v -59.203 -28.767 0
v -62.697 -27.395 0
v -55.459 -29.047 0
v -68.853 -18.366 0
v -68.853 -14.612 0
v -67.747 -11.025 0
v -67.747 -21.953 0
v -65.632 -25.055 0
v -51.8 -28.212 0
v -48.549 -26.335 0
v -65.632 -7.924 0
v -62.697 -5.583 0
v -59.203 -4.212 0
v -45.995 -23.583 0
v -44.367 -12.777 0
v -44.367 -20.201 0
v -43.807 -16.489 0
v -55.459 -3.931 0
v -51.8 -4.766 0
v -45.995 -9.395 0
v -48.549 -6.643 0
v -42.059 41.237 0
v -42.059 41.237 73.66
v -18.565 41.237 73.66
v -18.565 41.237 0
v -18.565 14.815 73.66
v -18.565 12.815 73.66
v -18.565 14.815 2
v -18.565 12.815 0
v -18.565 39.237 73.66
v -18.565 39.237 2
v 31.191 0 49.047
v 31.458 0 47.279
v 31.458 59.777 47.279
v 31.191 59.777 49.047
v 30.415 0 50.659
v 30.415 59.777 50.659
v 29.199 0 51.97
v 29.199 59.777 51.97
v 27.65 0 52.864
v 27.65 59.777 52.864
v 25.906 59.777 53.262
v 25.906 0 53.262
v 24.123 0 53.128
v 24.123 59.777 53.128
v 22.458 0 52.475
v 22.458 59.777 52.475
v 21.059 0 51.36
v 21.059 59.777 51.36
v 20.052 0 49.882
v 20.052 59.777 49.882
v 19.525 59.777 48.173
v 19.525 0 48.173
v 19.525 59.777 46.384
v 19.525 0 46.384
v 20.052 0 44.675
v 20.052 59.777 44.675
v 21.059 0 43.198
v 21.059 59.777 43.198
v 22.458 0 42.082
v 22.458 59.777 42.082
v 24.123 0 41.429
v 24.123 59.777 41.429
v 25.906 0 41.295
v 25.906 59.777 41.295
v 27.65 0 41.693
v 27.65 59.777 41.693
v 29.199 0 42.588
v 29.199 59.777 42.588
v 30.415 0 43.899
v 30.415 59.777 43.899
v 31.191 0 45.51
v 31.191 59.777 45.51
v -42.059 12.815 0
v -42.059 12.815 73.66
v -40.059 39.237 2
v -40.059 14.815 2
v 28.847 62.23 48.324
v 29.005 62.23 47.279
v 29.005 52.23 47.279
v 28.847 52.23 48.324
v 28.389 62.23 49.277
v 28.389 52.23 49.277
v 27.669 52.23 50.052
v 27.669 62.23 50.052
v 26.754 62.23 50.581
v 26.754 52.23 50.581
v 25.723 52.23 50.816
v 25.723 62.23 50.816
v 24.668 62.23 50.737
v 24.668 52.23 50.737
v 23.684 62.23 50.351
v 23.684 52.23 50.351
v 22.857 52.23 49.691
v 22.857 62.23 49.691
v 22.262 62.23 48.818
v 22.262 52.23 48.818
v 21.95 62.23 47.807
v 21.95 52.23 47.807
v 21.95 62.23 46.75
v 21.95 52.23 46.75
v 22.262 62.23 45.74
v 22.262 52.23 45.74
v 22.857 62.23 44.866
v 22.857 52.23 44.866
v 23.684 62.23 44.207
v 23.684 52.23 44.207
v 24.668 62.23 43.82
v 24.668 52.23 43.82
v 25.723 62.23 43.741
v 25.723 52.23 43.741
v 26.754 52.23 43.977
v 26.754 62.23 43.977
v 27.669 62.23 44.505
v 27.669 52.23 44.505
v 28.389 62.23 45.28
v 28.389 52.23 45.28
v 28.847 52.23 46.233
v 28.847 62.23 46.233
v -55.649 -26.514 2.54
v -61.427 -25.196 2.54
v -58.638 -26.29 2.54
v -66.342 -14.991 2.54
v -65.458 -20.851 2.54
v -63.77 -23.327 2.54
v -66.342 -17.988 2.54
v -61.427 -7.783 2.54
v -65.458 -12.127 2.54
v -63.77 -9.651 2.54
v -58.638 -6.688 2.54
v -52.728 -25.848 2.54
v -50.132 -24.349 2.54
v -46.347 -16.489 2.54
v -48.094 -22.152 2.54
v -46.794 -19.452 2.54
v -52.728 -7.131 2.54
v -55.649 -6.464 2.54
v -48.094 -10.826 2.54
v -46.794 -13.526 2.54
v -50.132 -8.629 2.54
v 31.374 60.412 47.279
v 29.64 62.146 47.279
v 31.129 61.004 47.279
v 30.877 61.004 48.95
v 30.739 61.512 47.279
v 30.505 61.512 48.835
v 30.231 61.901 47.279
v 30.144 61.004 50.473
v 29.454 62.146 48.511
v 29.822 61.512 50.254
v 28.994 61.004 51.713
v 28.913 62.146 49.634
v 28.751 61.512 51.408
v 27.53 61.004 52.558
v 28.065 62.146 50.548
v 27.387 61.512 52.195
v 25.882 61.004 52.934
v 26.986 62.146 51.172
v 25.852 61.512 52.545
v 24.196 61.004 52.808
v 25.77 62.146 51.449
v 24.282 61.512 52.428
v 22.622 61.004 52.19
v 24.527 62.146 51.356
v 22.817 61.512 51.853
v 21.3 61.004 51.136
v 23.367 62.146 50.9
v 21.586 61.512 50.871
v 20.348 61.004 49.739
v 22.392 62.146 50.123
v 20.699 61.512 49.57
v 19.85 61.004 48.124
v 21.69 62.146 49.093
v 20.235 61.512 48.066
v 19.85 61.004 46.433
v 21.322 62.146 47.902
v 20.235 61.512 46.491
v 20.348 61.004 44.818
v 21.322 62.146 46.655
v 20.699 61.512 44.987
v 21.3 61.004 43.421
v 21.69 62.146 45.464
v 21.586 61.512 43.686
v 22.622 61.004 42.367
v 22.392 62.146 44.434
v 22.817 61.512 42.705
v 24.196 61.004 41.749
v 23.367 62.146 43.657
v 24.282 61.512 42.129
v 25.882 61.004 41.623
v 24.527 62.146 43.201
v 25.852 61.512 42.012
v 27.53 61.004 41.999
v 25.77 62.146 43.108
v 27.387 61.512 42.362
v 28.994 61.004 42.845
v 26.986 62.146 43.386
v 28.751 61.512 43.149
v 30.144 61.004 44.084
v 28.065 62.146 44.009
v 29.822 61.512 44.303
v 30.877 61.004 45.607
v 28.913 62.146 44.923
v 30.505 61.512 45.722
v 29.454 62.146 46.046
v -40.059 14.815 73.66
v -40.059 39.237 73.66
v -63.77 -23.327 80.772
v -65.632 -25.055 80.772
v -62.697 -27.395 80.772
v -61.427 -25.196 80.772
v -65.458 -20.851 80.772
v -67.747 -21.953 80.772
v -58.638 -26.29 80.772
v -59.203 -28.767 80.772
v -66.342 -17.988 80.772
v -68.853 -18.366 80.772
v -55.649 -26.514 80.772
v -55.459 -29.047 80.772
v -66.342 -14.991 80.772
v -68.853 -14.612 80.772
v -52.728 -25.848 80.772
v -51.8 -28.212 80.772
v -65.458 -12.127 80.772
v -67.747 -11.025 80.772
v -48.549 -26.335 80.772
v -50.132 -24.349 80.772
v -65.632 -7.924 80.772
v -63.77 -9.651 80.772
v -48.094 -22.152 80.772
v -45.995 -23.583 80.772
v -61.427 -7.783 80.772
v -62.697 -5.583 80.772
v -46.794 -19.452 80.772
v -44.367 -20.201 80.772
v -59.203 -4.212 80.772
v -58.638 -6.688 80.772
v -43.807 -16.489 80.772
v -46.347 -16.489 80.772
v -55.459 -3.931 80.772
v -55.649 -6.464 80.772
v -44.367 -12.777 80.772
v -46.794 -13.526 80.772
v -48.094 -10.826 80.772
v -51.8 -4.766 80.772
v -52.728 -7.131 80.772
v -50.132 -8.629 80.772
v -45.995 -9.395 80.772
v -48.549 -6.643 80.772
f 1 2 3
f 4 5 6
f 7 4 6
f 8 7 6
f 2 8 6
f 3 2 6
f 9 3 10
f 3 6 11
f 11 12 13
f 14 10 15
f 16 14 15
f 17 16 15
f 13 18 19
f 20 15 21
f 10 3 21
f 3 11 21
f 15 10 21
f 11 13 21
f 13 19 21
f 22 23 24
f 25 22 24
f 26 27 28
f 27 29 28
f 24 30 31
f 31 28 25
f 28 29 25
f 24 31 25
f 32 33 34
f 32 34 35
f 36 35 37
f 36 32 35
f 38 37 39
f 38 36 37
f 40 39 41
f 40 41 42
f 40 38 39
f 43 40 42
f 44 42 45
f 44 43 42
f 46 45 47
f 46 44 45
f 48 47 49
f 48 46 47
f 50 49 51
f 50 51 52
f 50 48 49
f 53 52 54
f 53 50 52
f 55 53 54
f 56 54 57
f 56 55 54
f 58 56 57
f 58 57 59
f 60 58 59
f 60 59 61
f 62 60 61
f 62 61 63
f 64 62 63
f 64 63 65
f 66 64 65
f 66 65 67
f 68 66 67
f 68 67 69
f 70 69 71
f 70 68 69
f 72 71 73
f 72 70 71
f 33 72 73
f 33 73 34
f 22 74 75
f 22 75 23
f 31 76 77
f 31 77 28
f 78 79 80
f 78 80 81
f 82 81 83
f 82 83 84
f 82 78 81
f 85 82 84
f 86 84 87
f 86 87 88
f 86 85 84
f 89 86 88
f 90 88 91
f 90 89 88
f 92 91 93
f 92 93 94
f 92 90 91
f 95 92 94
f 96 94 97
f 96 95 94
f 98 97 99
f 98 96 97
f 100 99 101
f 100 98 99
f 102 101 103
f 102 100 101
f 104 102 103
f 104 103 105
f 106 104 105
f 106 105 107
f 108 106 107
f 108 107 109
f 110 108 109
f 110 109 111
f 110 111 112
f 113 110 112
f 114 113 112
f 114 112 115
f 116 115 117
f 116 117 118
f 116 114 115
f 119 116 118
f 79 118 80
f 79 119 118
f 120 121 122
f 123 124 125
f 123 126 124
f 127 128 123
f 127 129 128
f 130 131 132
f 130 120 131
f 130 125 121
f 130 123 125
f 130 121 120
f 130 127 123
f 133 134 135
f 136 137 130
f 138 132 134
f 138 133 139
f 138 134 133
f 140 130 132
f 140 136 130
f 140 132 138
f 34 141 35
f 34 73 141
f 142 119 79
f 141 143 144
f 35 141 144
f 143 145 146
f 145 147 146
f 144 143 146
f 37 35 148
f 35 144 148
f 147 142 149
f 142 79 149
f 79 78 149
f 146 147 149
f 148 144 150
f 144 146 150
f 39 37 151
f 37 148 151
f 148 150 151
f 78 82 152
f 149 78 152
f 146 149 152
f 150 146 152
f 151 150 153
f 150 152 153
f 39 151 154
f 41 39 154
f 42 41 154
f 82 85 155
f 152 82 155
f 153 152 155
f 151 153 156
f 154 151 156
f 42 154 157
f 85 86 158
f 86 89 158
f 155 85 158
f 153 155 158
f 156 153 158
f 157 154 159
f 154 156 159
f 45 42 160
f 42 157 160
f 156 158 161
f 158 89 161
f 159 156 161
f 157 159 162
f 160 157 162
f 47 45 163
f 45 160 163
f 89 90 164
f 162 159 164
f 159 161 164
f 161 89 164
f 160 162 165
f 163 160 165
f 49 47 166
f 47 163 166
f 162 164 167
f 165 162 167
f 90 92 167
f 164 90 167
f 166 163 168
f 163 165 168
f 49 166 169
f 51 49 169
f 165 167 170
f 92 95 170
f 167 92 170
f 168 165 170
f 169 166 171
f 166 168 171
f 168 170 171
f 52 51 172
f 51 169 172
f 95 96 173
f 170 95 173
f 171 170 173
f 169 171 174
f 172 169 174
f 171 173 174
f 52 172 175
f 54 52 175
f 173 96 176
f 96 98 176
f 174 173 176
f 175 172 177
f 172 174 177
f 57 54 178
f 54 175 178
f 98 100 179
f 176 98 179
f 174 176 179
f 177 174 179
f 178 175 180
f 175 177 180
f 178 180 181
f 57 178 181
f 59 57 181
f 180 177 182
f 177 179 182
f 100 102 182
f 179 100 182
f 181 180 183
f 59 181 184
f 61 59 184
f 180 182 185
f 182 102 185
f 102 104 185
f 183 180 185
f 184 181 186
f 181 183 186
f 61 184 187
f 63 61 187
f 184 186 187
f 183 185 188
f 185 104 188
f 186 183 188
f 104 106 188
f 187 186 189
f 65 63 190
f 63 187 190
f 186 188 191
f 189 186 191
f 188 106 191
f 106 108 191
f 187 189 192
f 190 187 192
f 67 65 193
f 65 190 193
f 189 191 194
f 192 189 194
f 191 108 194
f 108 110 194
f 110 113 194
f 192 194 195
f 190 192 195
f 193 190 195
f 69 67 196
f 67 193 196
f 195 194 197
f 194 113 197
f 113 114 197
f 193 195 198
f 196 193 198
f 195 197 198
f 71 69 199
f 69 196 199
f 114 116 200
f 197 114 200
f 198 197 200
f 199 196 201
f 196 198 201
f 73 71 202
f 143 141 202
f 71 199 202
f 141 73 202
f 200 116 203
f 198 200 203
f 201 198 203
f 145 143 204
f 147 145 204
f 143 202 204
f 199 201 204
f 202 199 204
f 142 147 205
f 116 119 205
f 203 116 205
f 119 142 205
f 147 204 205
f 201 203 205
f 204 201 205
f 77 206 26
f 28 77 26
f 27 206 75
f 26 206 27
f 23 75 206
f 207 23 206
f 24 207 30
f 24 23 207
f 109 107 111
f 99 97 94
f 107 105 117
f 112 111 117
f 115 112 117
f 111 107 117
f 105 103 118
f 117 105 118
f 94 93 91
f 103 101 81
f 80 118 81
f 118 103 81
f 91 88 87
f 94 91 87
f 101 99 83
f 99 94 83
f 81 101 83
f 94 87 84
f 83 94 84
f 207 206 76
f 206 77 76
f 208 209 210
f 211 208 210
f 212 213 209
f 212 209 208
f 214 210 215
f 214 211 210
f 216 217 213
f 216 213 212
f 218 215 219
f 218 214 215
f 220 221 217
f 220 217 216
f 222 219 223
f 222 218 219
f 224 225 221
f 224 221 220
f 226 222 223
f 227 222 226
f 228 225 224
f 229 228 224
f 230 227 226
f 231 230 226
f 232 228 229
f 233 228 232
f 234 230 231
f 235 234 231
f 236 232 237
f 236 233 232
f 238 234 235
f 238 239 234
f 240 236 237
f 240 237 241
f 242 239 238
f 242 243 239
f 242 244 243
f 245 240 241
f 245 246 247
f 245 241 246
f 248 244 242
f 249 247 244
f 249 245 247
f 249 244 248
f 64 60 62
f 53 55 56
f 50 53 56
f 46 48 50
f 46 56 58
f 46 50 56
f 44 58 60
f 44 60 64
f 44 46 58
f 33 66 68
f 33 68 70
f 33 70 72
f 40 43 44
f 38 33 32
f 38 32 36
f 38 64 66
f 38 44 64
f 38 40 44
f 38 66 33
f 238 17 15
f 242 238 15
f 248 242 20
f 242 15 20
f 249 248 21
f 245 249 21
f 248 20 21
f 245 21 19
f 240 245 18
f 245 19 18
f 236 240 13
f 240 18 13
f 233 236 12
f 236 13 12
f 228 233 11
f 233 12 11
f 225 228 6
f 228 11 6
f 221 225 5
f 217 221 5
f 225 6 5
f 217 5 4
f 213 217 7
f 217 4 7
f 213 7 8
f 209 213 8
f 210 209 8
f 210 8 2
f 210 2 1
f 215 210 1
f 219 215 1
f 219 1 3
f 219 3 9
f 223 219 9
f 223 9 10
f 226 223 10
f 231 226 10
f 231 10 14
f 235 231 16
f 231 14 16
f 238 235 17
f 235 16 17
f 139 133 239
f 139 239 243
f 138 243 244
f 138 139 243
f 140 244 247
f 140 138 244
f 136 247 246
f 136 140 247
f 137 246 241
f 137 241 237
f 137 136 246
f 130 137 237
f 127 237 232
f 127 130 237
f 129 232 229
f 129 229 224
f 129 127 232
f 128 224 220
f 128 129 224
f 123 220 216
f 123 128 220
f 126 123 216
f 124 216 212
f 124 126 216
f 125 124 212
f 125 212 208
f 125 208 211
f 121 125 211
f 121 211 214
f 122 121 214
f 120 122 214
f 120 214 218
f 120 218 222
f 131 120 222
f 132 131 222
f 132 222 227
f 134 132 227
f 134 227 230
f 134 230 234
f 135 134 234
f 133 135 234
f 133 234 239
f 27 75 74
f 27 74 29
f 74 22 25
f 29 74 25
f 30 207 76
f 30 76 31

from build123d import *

# Parameters (mm, degrees)
F0_W      = 23.4936941415
F0_H      = 28.4224431962
F1_DEPTH  = 73.66
F2_T      = -2
F3_R      = 6
F4_DEPTH  = 62.23
F5_R      = 12.5933558232
F6_DEPTH  = 80.772
F7_T      = -2.54
F8_R      = 2.4528409794
F9_DEPTH  = 6.604
F10_DEPTH = 6.35
F11_DEPTH = 16.51
F12_DEPTH = 10


with BuildPart() as f1:
    # F0 (on Top) → F1 (new body)
    with BuildSketch(Plane.XY):
        with Locations((-30.3117958829, 27.0259650424)):
            Rectangle(F0_W, F0_H)
    extrude(amount=F1_DEPTH)

    # F2
    f2_openings = [f1.faces().sort_by_distance(p)[0] for p in [
        (-30.311796, 27.025965, 73.66),
        (-18.564949, 27.025965, 36.83),
    ]]
    offset(amount=F2_T, openings=f2_openings)


with BuildPart() as f4:
    # F3 (on Front) → F4 (new body)
    with BuildSketch(Plane.XZ):
        with Locations((25.4577267915, 47.2786352038)):
            Circle(F3_R)
    extrude(amount=-F4_DEPTH)

    # F8
    f8_edges = [f4.edges().sort_by_distance(p)[0] for p in [
        (19.457727, 62.23, 47.278635),
    ]]
    fillet(f8_edges, radius=F8_R)

    # F9 (add): a face of the model
    f9_faces = [f4.faces().sort_by_distance(p)[0] for p in [
        (25.4577267915, 62.23, 47.2786352038),
    ]]
    extrude(f9_faces, amount=-F9_DEPTH)

    # F10 (add): a face of the model
    f10_faces = [f4.faces().sort_by_distance(p)[0] for p in [
        (25.4577267915, 62.23, 47.2786352038),
    ]]
    extrude(f10_faces, amount=-F10_DEPTH)

    # F11 (add): a face of the model
    f11_faces = [f4.faces().sort_by_distance(p)[0] for p in [
        (25.4577267915, 62.23, 47.2786352038),
    ]]
    extrude(f11_faces, amount=-F11_DEPTH)

    # F12 (cut): a face of the model
    f12_faces = [f4.faces().sort_by_distance(p)[0] for p in [
        (25.4577267915, 62.23, 47.2786352038),
    ]]
    extrude(f12_faces, amount=-F12_DEPTH, mode=Mode.SUBTRACT)


with BuildPart() as f6:
    # F5 (on Top) → F6 (new body)
    with BuildSketch(Plane.XY):
        with Locations((-56.4004927874, -16.4891798049)):
            Circle(F5_R)
    extrude(amount=F6_DEPTH)

    # F7
    f7_openings = [f6.faces().sort_by_distance(p)[0] for p in [
        (-56.400493, -16.48918, 80.772),
    ]]
    offset(amount=F7_T, openings=f7_openings)


solid = Compound([f1.part, f4.part, f6.part])
